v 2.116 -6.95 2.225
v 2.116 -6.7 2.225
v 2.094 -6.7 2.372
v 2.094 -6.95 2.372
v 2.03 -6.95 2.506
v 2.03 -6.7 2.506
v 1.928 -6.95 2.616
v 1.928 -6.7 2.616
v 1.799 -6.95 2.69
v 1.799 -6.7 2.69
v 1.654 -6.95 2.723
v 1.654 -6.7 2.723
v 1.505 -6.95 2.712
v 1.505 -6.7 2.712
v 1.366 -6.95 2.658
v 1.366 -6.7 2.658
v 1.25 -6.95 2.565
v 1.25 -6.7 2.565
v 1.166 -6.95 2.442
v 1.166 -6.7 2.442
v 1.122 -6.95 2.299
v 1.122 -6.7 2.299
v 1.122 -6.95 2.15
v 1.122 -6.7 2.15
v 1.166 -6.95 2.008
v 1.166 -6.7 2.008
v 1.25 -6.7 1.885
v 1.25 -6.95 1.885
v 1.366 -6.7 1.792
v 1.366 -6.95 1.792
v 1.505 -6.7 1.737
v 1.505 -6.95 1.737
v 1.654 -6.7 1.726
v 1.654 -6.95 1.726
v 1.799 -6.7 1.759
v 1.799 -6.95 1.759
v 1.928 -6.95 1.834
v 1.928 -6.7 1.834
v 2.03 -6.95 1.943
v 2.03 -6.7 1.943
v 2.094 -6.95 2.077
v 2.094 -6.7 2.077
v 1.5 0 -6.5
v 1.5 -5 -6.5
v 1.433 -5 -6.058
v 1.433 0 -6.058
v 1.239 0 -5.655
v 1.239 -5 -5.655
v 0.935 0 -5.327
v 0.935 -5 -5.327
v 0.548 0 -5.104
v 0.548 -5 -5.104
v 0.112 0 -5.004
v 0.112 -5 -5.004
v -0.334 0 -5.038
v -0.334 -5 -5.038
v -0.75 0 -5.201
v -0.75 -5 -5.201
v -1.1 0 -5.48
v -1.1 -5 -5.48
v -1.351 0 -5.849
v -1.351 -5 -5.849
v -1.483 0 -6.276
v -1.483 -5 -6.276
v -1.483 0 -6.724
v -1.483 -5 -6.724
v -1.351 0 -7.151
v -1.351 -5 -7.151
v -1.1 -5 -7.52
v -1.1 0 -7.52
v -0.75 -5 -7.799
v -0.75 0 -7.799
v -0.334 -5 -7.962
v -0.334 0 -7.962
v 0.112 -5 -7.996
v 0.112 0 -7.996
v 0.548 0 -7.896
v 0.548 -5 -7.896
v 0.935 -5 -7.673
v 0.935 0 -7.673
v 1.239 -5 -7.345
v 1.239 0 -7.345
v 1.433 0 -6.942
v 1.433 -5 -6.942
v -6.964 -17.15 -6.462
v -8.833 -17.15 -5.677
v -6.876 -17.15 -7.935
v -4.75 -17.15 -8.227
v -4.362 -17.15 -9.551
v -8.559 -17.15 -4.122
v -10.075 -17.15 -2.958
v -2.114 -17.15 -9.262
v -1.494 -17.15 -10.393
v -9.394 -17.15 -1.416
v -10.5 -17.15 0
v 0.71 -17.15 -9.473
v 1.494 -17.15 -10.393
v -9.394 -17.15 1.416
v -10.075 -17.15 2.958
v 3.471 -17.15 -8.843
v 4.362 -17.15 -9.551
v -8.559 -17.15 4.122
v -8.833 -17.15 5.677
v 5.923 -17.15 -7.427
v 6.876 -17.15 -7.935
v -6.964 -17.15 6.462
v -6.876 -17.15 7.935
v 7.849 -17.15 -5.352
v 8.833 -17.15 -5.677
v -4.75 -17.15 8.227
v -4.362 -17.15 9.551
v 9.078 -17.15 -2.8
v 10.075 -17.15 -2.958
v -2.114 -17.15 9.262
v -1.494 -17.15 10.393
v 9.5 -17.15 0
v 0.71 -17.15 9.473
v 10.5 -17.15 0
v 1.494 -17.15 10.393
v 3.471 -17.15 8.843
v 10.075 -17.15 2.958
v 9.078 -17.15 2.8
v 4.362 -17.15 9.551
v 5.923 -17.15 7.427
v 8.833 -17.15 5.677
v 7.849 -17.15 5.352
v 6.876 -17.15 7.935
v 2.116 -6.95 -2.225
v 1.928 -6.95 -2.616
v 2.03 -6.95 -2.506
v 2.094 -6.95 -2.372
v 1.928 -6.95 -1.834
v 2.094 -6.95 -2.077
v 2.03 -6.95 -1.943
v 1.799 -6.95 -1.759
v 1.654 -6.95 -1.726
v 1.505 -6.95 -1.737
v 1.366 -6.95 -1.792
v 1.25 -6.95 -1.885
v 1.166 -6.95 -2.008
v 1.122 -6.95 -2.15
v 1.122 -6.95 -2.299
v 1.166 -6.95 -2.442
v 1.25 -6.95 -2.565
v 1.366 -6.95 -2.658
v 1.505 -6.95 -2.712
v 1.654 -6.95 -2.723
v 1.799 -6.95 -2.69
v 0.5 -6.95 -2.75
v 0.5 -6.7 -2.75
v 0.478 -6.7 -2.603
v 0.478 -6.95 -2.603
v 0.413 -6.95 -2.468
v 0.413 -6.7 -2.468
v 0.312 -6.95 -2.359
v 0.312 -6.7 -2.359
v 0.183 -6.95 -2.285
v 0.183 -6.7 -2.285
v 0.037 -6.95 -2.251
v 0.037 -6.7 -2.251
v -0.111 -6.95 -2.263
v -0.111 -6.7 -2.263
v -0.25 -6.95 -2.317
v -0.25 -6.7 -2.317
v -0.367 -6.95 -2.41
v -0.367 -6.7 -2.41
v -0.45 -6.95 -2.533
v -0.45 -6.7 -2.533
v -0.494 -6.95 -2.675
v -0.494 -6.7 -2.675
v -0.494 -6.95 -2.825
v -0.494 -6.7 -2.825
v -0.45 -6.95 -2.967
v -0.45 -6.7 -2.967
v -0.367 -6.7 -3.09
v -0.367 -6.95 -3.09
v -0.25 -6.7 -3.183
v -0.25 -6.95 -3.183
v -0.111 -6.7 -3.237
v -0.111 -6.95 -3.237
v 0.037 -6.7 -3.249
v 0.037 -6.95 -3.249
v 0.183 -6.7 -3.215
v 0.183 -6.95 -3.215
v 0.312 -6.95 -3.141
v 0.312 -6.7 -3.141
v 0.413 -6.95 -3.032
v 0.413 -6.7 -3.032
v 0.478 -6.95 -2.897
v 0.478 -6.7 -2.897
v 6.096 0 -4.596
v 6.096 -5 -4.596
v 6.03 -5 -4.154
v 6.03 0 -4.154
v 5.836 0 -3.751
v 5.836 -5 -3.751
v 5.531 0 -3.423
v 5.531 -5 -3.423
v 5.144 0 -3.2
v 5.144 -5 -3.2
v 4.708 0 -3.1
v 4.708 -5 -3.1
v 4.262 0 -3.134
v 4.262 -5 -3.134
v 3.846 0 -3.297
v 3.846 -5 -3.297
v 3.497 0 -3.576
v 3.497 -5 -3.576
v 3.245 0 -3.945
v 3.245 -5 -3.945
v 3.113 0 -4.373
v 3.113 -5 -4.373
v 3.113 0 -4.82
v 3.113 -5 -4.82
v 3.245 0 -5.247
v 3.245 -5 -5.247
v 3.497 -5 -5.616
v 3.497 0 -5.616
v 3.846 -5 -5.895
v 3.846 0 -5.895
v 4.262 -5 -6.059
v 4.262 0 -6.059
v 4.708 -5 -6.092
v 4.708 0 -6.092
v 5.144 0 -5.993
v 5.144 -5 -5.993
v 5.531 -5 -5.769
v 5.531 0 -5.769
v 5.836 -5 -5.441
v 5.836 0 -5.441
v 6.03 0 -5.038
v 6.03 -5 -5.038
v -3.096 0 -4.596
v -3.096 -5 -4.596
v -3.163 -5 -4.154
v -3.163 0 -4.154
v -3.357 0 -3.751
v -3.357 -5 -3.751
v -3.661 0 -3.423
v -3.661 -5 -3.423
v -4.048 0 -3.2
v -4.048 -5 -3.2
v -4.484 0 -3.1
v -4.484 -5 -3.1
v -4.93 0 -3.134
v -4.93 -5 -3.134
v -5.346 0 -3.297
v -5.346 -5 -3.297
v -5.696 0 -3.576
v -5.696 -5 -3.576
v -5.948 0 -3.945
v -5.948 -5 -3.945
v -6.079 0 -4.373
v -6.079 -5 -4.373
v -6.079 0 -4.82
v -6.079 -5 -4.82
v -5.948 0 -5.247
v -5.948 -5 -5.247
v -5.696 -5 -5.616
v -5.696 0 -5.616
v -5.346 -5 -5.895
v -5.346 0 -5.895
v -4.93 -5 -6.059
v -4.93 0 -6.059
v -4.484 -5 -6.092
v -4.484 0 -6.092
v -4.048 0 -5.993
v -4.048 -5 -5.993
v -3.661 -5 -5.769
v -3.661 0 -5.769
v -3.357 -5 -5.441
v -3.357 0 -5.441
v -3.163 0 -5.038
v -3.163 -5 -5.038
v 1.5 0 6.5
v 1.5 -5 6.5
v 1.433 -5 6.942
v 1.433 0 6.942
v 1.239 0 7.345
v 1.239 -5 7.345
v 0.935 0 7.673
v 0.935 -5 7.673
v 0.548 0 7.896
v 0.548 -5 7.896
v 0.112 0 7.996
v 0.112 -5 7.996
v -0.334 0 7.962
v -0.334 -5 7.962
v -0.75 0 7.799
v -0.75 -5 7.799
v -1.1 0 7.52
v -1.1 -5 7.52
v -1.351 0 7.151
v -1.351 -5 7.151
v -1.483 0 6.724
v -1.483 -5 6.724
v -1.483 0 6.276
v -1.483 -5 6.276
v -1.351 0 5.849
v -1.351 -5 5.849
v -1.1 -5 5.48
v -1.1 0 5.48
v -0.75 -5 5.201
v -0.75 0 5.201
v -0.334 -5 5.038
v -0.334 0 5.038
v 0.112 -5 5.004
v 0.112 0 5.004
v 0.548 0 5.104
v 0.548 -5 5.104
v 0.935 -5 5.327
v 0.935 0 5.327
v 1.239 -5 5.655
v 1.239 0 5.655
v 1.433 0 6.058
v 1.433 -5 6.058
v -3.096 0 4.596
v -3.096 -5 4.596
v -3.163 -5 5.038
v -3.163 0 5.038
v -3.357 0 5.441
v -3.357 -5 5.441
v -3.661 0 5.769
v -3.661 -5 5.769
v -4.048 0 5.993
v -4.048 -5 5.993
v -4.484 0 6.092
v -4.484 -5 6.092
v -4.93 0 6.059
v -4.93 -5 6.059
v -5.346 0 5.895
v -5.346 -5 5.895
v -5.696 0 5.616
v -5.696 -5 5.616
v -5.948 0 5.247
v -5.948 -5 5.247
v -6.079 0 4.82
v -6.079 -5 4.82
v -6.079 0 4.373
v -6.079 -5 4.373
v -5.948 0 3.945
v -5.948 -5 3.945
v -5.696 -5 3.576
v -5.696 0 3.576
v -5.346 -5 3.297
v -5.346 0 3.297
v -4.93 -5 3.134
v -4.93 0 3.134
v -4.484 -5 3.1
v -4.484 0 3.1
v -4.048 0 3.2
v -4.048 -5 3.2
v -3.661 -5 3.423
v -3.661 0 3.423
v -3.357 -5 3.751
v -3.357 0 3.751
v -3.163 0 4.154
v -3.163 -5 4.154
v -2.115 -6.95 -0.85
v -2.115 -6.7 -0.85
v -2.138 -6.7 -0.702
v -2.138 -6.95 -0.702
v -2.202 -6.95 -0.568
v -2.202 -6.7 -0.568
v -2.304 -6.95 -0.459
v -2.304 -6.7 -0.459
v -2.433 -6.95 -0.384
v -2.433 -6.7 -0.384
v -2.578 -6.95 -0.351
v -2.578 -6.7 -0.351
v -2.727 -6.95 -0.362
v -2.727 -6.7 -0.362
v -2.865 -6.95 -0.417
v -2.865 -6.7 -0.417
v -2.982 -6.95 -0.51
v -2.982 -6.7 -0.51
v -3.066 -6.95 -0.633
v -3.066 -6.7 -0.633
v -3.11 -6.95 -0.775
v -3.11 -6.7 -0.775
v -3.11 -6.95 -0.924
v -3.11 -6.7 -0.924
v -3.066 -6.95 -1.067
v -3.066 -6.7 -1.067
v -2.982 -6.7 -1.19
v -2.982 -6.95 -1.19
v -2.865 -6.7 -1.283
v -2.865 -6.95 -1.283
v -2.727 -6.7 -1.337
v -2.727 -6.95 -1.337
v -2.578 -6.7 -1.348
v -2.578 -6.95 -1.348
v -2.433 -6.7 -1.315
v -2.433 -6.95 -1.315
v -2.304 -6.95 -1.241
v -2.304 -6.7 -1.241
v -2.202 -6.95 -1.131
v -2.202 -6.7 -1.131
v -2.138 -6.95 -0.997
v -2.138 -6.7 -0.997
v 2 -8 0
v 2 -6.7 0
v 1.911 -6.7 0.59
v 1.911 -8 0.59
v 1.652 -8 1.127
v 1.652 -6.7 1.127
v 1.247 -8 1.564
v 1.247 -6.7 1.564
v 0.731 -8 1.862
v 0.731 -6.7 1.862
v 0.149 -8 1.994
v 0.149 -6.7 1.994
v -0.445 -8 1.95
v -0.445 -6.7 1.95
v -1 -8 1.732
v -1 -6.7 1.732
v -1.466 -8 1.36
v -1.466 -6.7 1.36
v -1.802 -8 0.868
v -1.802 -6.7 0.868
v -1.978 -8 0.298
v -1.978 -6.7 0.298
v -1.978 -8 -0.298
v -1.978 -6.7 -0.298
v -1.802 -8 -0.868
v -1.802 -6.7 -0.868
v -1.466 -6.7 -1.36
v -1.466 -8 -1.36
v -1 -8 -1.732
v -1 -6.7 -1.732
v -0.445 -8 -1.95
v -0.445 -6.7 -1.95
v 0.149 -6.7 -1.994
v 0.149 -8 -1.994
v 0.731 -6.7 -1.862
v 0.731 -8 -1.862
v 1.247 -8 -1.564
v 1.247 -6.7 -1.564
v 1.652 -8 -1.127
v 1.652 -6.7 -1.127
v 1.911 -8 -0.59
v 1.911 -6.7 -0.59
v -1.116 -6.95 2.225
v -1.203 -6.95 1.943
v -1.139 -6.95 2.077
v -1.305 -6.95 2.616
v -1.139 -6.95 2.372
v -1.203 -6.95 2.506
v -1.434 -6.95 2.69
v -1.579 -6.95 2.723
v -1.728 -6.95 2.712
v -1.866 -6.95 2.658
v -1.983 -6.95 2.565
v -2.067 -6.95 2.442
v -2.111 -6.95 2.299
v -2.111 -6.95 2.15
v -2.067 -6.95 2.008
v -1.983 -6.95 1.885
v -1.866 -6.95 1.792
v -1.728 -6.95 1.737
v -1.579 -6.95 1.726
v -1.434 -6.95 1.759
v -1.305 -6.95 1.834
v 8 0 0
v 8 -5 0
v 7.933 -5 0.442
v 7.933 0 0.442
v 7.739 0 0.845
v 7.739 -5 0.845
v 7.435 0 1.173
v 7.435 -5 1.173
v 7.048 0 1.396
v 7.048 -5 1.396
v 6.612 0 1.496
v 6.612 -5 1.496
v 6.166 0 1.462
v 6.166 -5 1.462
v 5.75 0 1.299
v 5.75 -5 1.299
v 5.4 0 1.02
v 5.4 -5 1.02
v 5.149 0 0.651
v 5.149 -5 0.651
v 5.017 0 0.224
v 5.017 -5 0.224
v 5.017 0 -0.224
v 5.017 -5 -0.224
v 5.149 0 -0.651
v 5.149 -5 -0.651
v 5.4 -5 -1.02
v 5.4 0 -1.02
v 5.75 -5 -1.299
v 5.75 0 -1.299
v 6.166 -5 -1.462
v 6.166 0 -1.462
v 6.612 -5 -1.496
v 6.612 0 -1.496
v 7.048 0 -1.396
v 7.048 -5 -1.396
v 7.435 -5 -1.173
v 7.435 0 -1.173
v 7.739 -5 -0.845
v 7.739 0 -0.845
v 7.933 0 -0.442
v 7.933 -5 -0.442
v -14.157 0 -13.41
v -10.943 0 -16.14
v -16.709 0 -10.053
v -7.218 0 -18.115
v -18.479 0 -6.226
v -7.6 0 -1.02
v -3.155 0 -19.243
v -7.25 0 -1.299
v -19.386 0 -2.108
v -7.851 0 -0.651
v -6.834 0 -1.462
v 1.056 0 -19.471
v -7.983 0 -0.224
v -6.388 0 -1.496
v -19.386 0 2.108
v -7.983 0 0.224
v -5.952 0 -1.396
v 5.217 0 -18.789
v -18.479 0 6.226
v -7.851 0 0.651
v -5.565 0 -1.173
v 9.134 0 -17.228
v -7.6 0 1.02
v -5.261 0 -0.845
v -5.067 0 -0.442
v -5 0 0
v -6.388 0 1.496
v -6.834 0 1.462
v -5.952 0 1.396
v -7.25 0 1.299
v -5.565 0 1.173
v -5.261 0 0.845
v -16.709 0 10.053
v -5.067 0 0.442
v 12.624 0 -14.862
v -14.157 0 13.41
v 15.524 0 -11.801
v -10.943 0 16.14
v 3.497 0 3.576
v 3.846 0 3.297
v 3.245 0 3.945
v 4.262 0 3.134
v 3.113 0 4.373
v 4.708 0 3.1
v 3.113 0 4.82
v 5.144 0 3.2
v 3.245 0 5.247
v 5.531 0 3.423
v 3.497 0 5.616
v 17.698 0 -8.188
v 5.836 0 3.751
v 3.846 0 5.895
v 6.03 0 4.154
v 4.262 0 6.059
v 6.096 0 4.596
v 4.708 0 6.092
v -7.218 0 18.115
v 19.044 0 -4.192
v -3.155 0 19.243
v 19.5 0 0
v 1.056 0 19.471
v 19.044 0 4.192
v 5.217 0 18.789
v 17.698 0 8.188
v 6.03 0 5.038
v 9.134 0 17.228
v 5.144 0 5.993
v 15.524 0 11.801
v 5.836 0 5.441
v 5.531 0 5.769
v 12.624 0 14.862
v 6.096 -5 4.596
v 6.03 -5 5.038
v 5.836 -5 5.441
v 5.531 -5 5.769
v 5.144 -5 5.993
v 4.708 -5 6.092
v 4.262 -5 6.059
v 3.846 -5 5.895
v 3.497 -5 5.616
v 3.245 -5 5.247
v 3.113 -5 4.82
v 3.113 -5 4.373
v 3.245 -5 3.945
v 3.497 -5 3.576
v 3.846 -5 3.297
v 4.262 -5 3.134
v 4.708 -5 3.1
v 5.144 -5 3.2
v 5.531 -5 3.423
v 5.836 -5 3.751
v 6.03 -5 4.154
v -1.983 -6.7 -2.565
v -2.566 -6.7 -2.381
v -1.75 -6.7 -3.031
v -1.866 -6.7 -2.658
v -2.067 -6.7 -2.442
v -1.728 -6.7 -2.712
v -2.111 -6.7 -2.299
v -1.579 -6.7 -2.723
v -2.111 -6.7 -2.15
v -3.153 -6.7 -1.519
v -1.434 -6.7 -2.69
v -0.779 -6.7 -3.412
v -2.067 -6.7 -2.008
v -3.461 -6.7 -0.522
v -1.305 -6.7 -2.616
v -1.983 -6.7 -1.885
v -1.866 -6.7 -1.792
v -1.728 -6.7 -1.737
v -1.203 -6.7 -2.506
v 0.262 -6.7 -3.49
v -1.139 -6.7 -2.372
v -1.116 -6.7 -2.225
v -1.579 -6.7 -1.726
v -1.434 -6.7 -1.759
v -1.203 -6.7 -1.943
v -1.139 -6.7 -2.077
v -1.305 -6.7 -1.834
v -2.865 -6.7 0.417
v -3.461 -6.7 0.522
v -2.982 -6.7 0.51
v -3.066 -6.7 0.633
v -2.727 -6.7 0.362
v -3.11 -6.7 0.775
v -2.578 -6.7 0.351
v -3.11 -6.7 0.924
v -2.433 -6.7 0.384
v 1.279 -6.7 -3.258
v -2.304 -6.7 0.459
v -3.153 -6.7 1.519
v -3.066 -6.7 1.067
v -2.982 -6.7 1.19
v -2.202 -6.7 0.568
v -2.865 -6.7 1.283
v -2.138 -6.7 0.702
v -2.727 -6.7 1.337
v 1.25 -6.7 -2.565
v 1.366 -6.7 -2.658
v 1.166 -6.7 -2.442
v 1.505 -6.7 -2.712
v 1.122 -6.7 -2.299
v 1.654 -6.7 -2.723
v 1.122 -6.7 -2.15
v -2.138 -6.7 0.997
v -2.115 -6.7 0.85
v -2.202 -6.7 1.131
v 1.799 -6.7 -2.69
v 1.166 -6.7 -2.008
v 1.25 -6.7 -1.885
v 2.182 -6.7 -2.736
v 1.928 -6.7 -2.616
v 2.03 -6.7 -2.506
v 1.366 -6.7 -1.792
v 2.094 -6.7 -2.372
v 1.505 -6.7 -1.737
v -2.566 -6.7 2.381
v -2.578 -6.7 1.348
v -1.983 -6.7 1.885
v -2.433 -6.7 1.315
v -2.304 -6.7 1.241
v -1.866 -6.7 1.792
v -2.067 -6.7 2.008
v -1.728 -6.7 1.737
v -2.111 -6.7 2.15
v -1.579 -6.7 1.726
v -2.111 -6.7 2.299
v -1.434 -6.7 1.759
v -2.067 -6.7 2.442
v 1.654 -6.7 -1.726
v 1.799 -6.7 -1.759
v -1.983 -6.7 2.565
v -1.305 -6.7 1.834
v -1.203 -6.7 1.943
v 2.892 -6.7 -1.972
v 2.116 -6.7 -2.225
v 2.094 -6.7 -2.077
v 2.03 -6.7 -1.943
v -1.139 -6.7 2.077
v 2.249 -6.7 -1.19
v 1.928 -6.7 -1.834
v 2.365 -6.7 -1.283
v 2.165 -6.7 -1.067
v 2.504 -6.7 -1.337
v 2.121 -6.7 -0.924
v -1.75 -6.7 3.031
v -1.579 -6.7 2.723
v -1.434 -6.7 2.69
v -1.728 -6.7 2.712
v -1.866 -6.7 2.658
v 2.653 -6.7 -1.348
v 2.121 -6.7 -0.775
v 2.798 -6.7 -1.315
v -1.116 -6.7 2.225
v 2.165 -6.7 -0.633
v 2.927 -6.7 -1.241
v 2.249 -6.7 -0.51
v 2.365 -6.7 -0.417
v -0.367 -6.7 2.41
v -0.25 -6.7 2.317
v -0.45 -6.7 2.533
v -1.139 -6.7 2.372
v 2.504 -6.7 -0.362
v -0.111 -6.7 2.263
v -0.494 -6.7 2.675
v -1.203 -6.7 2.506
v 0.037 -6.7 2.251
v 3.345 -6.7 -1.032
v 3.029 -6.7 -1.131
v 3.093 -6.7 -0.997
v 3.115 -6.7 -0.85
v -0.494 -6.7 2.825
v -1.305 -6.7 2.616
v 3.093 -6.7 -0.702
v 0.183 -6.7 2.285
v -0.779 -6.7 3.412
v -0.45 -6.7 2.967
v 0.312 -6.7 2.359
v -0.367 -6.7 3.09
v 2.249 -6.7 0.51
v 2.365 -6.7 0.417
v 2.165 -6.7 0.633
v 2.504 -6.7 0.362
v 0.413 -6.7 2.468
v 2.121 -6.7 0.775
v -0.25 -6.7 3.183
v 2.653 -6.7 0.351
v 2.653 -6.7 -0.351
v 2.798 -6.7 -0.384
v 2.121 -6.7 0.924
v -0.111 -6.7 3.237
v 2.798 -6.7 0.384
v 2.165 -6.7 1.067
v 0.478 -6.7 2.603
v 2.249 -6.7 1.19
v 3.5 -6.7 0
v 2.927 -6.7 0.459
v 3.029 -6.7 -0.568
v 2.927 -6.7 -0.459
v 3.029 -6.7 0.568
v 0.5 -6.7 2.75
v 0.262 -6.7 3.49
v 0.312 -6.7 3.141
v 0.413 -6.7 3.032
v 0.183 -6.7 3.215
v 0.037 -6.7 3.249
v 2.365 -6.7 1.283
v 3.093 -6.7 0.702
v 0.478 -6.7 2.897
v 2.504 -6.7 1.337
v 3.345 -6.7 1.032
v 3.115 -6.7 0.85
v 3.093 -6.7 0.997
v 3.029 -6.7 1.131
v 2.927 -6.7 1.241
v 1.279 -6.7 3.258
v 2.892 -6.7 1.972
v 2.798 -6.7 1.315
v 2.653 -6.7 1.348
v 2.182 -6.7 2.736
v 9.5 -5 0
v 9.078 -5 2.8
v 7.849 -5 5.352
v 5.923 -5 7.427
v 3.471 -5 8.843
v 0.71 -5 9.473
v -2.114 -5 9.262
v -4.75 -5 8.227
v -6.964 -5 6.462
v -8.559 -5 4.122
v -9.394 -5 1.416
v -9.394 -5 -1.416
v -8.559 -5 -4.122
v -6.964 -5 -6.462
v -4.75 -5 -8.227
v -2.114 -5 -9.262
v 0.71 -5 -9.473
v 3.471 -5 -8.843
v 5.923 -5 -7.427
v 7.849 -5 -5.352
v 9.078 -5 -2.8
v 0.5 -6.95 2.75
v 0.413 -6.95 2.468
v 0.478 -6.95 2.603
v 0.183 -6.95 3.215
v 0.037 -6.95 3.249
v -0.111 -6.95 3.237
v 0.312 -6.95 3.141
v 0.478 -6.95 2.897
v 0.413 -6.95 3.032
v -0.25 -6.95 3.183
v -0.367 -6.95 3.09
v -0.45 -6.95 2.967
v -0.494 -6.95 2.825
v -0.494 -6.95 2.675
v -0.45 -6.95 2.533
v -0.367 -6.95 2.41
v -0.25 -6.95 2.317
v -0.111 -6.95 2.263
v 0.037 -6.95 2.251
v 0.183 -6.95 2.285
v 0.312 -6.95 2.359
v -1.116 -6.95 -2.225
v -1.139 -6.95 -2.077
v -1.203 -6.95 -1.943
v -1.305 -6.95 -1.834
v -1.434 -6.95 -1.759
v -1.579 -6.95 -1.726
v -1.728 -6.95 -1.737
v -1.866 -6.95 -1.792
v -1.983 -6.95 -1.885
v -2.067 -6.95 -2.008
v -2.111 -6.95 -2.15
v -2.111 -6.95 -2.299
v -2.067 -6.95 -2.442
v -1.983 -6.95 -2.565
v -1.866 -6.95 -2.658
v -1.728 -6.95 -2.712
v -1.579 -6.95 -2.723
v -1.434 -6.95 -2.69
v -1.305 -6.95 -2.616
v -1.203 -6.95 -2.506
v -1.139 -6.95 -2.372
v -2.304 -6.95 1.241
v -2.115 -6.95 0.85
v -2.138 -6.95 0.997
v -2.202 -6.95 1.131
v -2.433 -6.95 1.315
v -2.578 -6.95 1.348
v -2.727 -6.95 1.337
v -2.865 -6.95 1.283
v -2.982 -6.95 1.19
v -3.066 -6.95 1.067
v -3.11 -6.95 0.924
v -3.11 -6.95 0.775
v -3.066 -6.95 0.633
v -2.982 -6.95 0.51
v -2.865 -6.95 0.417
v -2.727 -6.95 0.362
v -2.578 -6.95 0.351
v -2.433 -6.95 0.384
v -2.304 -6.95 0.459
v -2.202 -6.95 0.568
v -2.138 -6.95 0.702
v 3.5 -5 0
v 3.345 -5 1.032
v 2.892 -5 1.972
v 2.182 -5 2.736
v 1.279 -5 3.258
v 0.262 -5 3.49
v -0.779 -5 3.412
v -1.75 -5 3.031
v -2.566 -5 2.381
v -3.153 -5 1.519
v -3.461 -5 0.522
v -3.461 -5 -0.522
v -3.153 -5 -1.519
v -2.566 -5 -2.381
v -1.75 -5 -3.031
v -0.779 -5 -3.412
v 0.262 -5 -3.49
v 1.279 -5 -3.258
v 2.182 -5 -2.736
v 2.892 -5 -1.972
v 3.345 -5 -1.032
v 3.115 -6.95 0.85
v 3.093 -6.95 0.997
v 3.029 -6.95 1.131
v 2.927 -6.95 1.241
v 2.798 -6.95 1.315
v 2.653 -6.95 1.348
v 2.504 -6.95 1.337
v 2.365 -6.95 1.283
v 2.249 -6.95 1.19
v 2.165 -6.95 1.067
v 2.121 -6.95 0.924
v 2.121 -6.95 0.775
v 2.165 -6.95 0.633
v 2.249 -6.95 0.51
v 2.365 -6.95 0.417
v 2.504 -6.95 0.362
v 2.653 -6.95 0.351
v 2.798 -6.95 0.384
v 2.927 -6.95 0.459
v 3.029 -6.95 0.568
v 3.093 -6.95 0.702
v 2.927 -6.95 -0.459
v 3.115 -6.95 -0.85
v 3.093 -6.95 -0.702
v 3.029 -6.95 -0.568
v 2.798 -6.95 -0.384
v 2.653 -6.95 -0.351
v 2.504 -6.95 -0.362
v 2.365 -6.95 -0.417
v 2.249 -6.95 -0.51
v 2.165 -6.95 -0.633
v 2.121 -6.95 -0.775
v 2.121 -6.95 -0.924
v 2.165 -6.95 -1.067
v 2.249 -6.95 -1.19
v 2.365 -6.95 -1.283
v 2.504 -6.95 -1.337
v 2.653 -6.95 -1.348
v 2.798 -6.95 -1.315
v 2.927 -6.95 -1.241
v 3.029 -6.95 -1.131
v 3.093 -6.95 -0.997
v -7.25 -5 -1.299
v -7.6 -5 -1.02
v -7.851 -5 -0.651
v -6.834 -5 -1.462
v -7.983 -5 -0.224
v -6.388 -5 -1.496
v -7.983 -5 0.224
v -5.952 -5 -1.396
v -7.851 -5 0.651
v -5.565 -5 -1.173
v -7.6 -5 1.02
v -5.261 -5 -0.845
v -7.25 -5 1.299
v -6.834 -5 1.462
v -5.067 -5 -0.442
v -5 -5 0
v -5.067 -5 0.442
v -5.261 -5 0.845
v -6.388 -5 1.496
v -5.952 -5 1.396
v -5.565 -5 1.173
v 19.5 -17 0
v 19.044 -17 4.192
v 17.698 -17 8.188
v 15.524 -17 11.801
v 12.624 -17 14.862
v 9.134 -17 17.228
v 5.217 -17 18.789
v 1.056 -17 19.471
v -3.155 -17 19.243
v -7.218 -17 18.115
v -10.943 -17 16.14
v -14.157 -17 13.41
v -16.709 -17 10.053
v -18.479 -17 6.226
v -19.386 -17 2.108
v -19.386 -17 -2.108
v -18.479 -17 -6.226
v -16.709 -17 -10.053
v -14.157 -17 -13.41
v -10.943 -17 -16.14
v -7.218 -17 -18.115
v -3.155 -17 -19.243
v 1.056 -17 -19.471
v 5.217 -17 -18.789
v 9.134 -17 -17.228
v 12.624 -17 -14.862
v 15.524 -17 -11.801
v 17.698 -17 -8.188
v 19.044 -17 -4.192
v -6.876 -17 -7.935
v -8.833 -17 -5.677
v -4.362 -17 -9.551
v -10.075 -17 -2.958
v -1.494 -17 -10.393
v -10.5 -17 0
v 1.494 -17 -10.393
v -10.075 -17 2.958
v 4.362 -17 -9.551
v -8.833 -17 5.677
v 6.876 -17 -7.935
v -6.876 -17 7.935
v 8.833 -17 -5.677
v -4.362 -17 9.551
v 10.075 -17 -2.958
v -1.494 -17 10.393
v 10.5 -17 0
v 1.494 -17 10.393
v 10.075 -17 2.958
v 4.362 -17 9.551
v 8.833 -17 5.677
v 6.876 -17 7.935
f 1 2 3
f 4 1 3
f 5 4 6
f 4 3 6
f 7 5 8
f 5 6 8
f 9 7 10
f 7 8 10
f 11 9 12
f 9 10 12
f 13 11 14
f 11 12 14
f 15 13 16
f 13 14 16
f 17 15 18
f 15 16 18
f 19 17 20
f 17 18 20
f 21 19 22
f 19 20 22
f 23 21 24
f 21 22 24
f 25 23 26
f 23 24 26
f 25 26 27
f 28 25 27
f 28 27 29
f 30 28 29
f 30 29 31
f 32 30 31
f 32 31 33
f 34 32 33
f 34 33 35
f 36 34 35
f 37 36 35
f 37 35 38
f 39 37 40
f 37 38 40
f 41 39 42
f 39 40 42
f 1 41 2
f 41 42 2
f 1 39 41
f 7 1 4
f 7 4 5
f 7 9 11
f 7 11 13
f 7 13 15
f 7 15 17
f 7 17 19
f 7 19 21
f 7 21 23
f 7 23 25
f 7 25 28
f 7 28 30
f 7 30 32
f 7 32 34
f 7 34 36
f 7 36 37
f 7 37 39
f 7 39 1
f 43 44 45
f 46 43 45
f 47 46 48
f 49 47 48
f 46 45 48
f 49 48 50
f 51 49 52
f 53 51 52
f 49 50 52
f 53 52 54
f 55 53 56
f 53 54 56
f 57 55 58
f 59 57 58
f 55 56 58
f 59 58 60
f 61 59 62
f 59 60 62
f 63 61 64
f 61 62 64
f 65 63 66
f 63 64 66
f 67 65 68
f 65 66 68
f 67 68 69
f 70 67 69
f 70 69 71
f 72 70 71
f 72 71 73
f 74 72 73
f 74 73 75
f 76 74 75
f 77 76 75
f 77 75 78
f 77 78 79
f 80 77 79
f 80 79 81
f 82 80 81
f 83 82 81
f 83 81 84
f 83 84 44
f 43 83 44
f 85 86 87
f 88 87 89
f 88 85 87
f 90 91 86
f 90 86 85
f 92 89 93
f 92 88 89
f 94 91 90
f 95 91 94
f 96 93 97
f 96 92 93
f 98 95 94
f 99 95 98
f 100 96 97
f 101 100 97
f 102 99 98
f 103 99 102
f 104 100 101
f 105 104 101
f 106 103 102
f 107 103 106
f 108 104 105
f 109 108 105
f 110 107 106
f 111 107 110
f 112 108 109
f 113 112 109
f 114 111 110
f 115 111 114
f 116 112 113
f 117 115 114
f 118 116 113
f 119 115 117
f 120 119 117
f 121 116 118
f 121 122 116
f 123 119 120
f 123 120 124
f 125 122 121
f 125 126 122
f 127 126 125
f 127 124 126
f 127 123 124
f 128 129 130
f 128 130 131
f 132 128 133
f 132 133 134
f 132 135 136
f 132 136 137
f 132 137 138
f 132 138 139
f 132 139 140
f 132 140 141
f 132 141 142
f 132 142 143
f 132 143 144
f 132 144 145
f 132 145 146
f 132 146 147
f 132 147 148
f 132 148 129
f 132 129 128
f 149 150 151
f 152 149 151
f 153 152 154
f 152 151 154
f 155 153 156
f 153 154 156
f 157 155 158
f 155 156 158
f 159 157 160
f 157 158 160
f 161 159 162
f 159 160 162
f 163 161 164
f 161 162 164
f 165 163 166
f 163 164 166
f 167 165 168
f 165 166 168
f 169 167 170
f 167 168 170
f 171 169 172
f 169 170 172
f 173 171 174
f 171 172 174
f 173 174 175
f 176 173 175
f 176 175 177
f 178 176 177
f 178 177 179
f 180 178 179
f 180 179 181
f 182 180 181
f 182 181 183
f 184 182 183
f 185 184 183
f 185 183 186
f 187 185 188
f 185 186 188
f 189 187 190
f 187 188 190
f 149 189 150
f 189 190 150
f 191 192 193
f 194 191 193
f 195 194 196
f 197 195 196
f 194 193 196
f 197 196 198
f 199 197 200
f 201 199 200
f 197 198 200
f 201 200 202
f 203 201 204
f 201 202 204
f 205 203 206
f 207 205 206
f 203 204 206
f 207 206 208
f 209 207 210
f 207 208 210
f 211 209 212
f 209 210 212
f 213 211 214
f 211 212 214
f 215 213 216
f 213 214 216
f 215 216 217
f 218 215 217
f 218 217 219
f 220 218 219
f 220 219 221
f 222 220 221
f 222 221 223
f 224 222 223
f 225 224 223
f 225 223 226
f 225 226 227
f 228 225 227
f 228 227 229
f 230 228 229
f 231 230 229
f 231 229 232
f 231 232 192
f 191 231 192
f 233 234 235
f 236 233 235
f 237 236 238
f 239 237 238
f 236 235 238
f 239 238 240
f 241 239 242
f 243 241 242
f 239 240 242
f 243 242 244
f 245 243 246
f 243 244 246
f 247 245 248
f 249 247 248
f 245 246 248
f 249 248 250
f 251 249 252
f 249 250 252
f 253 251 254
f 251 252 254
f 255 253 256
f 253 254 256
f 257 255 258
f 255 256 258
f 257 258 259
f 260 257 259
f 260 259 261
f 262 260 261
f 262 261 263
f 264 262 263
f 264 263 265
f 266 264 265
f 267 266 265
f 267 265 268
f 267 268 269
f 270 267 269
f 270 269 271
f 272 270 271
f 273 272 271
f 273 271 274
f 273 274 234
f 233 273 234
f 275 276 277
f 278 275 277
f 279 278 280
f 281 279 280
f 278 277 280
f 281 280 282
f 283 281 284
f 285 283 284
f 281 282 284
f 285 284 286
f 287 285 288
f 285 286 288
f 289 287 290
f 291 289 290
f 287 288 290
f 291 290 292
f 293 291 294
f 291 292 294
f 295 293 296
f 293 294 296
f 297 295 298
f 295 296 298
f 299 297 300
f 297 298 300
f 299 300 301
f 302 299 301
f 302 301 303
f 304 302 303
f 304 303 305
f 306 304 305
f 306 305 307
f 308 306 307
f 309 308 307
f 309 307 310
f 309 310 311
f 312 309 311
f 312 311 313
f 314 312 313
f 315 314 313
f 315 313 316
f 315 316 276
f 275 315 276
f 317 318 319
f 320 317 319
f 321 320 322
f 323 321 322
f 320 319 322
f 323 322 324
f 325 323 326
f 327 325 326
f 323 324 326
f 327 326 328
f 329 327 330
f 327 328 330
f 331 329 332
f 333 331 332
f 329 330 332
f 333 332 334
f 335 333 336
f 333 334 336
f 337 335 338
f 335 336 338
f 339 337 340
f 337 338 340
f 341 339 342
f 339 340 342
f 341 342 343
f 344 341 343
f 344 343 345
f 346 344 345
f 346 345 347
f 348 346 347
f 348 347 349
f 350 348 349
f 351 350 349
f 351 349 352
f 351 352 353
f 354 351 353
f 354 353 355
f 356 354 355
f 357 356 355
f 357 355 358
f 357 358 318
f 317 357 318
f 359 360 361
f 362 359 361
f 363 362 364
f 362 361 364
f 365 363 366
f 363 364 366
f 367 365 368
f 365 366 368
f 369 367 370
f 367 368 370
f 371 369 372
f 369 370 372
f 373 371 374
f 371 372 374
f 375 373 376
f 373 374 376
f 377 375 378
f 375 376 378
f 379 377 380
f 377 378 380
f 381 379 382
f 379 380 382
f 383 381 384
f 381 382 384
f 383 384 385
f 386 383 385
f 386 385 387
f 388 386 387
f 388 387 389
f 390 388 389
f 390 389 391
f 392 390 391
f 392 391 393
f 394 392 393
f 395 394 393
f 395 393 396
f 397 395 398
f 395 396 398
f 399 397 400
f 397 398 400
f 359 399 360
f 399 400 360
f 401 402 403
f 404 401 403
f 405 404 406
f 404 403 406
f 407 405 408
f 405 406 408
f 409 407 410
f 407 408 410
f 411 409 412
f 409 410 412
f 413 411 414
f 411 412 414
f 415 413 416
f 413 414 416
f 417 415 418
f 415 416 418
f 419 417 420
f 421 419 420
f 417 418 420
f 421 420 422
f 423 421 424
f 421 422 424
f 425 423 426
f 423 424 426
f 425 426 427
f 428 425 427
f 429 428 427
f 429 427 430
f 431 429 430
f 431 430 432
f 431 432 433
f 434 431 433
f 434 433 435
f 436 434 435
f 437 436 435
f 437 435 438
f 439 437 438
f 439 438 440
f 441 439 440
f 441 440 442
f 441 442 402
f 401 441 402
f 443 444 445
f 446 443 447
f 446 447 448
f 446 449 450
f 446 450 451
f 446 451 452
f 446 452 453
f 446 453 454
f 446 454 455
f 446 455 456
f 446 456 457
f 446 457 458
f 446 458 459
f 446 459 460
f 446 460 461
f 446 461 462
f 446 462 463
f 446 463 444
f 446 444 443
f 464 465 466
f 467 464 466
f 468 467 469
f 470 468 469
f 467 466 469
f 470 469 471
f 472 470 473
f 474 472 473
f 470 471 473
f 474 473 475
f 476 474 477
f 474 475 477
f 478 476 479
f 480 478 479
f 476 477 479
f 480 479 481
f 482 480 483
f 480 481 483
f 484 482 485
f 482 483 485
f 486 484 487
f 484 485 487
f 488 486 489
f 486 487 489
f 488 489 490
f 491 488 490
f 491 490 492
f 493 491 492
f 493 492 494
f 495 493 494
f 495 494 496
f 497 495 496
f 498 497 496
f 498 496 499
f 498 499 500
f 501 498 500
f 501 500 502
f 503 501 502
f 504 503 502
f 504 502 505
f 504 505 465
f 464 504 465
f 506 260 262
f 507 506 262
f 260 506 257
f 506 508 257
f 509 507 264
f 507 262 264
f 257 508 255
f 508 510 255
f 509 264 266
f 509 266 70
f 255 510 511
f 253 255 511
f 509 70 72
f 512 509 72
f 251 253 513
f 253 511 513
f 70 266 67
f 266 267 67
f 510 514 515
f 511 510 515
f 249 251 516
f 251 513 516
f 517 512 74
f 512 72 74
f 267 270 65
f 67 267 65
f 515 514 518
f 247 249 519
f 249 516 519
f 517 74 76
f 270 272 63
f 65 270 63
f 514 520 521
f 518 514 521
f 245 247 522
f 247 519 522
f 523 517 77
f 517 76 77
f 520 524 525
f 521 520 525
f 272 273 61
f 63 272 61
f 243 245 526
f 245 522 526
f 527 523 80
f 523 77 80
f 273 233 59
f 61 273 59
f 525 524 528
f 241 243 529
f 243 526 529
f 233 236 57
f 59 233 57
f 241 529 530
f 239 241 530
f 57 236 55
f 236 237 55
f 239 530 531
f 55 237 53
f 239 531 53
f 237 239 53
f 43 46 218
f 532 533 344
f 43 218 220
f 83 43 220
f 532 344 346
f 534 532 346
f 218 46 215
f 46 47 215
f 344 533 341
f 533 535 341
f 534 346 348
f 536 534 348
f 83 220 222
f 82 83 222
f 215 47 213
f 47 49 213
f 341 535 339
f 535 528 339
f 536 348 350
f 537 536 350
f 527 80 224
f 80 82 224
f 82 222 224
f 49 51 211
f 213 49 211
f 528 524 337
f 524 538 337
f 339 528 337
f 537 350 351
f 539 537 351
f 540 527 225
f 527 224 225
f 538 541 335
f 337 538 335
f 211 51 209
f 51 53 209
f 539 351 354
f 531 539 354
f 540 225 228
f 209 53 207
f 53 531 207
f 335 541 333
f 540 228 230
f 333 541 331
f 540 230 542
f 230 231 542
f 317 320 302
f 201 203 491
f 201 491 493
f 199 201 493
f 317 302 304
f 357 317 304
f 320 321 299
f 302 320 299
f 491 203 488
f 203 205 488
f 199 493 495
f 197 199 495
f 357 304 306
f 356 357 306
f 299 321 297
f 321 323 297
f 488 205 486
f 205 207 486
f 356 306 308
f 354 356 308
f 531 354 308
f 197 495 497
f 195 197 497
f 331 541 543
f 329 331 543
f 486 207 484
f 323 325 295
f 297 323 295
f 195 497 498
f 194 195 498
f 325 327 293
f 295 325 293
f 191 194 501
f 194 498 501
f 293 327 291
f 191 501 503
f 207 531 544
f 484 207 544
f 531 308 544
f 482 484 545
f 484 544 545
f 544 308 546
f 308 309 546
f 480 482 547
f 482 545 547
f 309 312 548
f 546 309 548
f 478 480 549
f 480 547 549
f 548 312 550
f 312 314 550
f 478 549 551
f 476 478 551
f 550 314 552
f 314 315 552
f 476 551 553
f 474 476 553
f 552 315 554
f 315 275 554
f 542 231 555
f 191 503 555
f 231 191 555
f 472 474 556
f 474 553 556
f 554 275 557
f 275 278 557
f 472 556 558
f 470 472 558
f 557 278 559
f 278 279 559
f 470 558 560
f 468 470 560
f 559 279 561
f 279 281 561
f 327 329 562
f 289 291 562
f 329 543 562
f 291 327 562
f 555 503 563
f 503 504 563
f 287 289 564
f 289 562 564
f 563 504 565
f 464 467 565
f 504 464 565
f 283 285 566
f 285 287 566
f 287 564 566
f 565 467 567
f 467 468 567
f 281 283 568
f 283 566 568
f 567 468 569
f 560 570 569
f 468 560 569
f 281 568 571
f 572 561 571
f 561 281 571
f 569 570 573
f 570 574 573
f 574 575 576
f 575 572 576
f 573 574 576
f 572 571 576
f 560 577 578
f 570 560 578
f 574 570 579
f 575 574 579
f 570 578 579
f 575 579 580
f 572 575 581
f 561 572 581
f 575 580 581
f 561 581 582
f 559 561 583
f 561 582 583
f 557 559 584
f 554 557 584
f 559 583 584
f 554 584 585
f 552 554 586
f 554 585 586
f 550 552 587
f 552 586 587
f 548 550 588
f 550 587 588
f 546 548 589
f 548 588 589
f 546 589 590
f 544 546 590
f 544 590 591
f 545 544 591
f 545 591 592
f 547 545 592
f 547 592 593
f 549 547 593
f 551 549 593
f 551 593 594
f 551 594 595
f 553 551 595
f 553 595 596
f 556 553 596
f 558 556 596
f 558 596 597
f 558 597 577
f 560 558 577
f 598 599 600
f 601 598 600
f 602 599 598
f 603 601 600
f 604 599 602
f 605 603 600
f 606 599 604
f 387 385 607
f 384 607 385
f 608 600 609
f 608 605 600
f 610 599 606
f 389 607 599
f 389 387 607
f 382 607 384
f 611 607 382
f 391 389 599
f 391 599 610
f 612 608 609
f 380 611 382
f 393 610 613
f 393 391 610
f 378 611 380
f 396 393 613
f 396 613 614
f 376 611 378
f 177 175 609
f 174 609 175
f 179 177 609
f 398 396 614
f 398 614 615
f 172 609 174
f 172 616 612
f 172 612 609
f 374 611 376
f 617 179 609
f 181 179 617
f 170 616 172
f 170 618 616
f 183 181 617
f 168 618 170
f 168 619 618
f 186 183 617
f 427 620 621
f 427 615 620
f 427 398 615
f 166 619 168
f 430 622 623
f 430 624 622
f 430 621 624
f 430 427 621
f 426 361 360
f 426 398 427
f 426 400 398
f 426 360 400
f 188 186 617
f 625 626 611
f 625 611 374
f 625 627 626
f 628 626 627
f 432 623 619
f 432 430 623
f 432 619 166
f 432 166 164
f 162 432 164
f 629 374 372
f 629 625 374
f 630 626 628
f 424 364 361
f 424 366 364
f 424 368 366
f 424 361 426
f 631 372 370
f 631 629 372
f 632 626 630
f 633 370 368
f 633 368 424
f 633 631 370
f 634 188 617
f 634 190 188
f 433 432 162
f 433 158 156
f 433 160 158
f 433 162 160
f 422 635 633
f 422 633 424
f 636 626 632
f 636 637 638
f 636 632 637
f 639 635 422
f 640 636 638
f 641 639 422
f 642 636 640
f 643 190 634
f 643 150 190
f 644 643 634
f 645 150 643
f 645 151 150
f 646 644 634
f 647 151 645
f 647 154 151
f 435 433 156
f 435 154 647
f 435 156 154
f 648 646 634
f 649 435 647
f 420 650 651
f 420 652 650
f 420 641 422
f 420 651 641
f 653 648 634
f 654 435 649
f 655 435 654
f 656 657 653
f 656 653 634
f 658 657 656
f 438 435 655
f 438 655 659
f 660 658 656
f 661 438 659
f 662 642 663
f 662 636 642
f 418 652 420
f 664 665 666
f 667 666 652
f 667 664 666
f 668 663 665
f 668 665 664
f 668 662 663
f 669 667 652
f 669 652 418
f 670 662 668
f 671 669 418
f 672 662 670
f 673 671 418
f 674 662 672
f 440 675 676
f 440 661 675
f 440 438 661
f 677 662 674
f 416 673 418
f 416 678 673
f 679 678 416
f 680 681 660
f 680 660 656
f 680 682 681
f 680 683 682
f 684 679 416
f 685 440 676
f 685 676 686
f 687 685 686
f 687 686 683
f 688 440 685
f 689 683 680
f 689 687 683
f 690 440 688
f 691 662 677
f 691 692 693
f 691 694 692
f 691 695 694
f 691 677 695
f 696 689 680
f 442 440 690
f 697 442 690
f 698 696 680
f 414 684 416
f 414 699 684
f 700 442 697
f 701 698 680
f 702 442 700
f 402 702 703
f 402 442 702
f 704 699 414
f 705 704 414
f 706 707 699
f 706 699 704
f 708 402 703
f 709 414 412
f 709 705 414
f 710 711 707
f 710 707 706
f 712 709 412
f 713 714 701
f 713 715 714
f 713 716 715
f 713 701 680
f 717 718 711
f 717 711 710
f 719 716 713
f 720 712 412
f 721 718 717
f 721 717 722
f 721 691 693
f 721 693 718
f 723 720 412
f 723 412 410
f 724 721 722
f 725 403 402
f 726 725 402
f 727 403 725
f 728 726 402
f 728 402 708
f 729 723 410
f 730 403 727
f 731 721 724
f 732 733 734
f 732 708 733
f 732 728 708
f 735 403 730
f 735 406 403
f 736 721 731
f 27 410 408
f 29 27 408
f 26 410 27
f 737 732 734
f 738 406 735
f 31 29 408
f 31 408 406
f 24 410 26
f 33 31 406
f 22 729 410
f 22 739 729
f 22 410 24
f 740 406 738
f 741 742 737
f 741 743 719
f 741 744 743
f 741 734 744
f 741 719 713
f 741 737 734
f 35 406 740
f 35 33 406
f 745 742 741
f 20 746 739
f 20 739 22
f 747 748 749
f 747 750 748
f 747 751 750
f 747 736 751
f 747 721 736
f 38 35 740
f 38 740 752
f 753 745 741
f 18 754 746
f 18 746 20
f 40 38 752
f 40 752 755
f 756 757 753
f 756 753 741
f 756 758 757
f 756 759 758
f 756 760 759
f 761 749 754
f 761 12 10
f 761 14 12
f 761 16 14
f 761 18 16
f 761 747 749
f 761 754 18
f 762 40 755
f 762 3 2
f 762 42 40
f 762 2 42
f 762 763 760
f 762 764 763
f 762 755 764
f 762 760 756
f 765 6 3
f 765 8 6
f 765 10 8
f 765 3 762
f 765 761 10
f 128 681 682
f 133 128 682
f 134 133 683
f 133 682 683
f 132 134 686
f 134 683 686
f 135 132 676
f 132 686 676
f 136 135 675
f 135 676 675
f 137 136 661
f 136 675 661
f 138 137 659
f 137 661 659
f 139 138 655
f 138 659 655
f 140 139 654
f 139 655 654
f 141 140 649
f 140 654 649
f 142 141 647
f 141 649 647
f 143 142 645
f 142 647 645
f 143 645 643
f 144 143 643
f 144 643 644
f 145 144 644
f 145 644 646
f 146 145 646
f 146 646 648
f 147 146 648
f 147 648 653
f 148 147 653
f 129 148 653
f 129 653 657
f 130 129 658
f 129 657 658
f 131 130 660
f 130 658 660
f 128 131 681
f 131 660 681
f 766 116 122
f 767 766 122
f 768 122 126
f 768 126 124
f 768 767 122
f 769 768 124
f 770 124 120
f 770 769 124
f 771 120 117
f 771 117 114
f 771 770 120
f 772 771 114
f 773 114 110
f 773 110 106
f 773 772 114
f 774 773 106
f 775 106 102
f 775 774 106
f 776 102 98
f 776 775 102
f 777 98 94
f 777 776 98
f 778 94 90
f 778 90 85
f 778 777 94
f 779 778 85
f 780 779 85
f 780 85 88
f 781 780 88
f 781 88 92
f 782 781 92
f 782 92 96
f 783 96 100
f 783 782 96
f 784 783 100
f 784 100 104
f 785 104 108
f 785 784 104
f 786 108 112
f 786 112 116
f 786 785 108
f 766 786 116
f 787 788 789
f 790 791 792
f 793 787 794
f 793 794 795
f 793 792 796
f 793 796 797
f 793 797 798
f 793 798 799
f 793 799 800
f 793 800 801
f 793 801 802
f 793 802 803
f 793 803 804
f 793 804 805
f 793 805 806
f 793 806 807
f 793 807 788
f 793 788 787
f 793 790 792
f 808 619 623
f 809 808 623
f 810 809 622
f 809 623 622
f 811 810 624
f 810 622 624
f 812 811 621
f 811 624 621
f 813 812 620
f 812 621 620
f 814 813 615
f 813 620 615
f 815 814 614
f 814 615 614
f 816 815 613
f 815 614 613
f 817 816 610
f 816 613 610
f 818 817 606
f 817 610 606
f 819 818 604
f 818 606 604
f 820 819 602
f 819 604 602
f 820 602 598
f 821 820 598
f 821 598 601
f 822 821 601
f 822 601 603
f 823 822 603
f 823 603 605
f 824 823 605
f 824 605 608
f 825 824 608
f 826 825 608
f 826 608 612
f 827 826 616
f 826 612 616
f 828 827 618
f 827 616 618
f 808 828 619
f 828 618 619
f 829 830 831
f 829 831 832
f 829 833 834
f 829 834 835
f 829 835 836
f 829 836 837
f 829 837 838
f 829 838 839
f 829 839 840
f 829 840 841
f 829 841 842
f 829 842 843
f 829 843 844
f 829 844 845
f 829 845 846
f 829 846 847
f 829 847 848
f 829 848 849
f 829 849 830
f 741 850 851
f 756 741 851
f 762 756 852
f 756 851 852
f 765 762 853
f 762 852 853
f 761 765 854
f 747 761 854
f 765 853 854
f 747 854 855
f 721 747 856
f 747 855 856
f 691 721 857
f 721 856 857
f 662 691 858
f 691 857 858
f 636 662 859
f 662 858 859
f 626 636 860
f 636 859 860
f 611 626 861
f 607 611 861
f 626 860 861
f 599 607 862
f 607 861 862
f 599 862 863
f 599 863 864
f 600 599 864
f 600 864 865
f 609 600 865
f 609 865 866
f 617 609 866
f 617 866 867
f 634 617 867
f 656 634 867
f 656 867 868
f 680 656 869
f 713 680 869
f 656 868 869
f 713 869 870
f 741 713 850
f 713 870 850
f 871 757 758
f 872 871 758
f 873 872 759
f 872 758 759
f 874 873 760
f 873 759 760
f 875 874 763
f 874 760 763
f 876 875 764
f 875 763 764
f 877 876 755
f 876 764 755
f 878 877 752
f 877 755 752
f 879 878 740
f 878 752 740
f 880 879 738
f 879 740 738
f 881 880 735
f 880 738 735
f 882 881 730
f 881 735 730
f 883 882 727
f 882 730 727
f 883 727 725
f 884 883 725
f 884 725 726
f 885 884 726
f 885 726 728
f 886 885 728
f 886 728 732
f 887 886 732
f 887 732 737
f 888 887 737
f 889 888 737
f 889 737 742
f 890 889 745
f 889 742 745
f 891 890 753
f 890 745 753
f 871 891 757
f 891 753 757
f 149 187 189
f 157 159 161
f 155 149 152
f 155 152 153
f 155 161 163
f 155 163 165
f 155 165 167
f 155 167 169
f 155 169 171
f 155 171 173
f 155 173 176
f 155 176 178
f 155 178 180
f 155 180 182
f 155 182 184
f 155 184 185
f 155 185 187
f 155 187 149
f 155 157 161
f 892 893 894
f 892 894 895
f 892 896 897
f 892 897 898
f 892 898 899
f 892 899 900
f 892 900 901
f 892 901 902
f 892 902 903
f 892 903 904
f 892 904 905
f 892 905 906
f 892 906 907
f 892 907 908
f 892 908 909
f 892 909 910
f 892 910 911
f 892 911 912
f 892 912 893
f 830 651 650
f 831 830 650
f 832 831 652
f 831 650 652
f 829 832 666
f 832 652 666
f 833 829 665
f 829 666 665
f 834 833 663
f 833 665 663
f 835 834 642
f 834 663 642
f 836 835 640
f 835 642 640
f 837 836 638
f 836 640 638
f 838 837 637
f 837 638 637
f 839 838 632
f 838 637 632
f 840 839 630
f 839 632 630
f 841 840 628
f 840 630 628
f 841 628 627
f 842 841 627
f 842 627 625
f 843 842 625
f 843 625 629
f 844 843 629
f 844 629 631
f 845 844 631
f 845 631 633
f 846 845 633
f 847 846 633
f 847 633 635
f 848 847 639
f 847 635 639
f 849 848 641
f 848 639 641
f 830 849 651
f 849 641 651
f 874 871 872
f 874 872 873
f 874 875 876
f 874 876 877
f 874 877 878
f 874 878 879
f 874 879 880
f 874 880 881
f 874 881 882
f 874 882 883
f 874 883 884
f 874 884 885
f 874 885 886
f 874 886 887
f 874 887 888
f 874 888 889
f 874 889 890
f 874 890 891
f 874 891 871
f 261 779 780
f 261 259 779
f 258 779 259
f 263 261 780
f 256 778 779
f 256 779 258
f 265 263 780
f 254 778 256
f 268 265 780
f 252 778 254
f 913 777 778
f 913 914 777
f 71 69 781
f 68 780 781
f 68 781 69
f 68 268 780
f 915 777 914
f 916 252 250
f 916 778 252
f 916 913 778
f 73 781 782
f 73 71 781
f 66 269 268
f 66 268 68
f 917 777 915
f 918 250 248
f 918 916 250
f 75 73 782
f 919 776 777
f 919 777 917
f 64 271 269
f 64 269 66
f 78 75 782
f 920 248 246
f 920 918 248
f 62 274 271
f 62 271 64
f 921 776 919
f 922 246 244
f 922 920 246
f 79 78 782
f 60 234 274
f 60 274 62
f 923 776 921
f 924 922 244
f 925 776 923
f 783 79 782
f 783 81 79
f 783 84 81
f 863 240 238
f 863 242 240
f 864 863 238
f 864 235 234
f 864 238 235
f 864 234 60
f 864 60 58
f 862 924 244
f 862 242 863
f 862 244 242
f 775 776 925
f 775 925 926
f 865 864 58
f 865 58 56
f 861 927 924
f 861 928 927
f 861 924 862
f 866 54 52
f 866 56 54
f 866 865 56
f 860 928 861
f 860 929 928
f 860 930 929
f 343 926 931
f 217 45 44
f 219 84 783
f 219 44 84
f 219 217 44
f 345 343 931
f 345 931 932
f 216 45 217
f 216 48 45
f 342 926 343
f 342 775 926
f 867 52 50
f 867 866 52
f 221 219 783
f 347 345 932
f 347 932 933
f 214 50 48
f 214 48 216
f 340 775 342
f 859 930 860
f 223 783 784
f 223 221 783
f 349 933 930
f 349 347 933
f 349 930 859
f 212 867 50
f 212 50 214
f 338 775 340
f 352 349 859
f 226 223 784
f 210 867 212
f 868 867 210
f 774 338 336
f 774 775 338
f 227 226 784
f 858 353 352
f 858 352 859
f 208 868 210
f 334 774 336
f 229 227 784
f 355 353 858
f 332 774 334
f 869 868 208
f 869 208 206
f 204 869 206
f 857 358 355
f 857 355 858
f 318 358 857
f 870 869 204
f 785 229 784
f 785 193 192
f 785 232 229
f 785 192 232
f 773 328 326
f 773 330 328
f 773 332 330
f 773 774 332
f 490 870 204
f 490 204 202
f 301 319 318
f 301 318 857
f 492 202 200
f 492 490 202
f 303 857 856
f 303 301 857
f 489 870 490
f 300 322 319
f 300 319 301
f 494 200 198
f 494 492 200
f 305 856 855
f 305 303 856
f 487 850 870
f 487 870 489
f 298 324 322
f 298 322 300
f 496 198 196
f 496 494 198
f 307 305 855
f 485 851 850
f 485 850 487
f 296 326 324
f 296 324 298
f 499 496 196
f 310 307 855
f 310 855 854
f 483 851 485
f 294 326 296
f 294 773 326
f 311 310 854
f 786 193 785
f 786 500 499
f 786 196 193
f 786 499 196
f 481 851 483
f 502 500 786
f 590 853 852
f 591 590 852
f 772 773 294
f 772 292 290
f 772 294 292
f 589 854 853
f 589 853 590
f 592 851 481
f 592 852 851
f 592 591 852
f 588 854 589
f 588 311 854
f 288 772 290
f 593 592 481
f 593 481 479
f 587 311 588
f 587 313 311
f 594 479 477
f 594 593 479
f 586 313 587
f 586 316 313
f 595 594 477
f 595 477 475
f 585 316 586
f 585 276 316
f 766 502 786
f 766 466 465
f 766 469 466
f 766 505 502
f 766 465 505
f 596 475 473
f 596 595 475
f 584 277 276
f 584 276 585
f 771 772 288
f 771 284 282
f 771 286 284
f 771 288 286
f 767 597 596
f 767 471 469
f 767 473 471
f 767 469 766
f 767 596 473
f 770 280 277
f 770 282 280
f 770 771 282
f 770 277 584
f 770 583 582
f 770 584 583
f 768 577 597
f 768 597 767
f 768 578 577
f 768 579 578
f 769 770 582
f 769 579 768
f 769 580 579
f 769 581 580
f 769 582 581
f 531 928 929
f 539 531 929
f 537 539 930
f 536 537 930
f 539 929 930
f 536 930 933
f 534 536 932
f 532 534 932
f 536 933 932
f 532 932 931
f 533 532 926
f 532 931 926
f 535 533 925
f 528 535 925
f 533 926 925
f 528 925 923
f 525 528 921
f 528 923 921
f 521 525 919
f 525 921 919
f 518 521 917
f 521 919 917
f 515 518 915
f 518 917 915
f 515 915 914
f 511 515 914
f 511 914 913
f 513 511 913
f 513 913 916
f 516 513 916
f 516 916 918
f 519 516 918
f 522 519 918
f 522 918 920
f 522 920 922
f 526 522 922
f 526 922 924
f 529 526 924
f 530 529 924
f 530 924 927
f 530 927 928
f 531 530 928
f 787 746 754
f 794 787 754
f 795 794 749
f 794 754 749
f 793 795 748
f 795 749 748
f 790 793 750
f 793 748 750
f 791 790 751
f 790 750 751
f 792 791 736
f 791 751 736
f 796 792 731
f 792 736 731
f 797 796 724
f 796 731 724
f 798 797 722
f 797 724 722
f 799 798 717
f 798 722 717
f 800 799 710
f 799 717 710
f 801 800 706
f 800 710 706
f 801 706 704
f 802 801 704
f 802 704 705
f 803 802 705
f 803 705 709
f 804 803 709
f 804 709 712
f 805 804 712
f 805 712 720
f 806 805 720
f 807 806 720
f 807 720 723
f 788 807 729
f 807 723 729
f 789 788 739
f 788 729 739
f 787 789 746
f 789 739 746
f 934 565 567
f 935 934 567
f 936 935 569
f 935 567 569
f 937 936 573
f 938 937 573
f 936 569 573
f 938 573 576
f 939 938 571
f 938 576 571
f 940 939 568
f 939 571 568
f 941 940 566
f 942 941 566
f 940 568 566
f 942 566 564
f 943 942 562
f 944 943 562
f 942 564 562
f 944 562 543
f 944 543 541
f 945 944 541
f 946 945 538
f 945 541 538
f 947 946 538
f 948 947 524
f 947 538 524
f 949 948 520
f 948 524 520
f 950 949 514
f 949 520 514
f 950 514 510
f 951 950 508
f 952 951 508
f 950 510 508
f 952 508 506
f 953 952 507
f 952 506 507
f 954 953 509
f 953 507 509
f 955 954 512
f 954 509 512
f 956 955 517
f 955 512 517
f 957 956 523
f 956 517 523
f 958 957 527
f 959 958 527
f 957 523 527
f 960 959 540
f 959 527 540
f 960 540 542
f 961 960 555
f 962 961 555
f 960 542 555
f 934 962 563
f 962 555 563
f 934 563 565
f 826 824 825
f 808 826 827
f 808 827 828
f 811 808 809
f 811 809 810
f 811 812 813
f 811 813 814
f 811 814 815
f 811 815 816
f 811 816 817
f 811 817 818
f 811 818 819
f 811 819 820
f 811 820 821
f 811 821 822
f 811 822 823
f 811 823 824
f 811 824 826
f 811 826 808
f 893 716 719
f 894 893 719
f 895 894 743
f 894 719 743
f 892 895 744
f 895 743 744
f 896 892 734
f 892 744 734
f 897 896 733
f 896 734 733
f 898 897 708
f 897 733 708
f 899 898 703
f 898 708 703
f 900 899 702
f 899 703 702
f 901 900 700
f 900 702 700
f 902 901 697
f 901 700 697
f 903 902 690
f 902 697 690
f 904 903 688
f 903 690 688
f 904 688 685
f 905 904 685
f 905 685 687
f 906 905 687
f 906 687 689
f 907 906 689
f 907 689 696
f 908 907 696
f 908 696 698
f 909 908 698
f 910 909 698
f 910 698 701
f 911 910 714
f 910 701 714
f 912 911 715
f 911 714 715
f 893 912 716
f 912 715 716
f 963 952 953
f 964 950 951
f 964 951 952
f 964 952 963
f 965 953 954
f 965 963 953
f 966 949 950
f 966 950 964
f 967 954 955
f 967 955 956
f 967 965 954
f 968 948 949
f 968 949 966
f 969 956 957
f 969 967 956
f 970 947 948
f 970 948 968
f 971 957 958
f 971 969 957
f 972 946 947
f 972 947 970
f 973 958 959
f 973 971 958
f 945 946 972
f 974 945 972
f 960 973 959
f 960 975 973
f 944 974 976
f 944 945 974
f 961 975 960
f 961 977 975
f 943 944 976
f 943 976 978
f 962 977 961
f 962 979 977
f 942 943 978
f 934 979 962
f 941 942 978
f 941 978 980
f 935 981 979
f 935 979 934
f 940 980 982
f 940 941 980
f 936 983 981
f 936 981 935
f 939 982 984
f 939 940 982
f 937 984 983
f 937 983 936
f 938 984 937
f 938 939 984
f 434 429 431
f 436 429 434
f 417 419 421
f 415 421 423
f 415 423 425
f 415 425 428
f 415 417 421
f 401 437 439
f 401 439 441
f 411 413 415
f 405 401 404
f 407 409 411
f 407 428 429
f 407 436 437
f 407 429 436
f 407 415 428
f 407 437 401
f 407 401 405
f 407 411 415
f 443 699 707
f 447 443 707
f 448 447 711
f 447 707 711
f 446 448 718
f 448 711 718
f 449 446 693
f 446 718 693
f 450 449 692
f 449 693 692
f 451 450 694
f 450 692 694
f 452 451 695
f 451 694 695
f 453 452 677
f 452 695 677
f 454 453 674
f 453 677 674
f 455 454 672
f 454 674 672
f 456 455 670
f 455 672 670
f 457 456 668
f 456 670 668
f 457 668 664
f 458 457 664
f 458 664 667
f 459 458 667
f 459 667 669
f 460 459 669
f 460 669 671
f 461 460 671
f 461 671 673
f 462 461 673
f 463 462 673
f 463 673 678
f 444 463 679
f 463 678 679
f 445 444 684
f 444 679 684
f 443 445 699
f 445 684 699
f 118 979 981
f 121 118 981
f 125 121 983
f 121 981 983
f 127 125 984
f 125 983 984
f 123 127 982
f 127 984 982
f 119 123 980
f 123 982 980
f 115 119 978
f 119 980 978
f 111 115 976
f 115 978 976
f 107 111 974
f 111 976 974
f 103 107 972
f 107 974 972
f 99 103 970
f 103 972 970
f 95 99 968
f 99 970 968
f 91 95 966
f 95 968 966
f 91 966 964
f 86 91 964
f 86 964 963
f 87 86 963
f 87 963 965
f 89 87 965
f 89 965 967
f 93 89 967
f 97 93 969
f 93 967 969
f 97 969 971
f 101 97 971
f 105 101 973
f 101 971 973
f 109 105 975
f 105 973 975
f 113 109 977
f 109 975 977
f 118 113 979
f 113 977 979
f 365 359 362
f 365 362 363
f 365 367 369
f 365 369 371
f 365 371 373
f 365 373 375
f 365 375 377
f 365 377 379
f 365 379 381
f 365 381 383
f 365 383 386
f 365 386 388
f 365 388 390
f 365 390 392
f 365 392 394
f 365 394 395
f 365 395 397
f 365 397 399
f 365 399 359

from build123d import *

# Parameters (mm, degrees)
F0_R      = 19.5
F1_DEPTH  = 17
F2_R      = 9.5
F3_DEPTH  = 12
F4_R      = 10.5
F4_R_2    = 9.5
F5_DEPTH  = 0.15
F6_R      = 2
F7_DEPTH  = 3
F8_R      = 3.5
F8_R_2    = 2
F9_DEPTH  = 1.7
F10_R     = 0.5
F11_DEPTH = 0.25
F12_R     = 1.5
F13_DEPTH = 25


with BuildPart() as f1:
    # F0 (on Front) → F1 (new body)
    with BuildSketch(Plane.XZ):
        Circle(F0_R)
    extrude(amount=F1_DEPTH)

    # F2 (on face) → F3 (cut)
    with BuildSketch(Plane.XZ.offset(17)):
        Circle(F2_R)
    extrude(amount=-F3_DEPTH, mode=Mode.SUBTRACT)

    # F4 (on face) → F5 (join)
    with BuildSketch(Plane.XZ.offset(17)):
        Circle(F4_R)
        Circle(F4_R_2, mode=Mode.SUBTRACT)
    extrude(amount=F5_DEPTH)

    # F6 (on face) → F7 (join)
    with BuildSketch(Plane.XZ.offset(5)):
        Circle(F6_R)
    extrude(amount=F7_DEPTH)

    # F8 (on face) → F9 (join)
    with BuildSketch(Plane.XZ.offset(5)):
        Circle(F8_R)
        Circle(F8_R_2, mode=Mode.SUBTRACT)
    extrude(amount=F9_DEPTH)

    # F10 (on face) → F11 (join)
    with BuildSketch(Plane.XZ.offset(6.7)):
        with Locations((0, 2.75)):
            Circle(F10_R)
        with Locations((1.6164094438, 2.2247967345)):
            Circle(F10_R)
        with Locations((2.6154054198, -0.8497967345)):
            Circle(F10_R)
        with Locations((1.6164094438, -2.2247967345)):
            Circle(F10_R)
        with Locations((0, -2.75)):
            Circle(F10_R)
        with Locations((2.6154054198, 0.8497967345)):
            Circle(F10_R)
        with Locations((-1.6164094438, -2.2247967345)):
            Circle(F10_R)
        with Locations((-2.6154054198, -0.8497967345)):
            Circle(F10_R)
        with Locations((-2.6154054198, 0.8497967345)):
            Circle(F10_R)
        with Locations((-1.6164094438, 2.2247967345)):
            Circle(F10_R)
    extrude(amount=F11_DEPTH)

    # F12 (on face) → F13 (cut)
    with BuildSketch(Plane.XZ.offset(5)):
        with Locations((0, 6.5)):
            Circle(F12_R)
        with Locations((4.5961940777, 4.5961940777)):
            Circle(F12_R)
        with Locations((6.5, 0)):
            Circle(F12_R)
        with Locations((-4.5961940777, 4.5961940777)):
            Circle(F12_R)
        with Locations((-6.5, 0)):
            Circle(F12_R)
        with Locations((-4.5961940777, -4.5961940777)):
            Circle(F12_R)
        with Locations((4.5961940777, -4.5961940777)):
            Circle(F12_R)
        with Locations((0, -6.5)):
            Circle(F12_R)
    extrude(amount=-F13_DEPTH, mode=Mode.SUBTRACT)


solid = f1.part
